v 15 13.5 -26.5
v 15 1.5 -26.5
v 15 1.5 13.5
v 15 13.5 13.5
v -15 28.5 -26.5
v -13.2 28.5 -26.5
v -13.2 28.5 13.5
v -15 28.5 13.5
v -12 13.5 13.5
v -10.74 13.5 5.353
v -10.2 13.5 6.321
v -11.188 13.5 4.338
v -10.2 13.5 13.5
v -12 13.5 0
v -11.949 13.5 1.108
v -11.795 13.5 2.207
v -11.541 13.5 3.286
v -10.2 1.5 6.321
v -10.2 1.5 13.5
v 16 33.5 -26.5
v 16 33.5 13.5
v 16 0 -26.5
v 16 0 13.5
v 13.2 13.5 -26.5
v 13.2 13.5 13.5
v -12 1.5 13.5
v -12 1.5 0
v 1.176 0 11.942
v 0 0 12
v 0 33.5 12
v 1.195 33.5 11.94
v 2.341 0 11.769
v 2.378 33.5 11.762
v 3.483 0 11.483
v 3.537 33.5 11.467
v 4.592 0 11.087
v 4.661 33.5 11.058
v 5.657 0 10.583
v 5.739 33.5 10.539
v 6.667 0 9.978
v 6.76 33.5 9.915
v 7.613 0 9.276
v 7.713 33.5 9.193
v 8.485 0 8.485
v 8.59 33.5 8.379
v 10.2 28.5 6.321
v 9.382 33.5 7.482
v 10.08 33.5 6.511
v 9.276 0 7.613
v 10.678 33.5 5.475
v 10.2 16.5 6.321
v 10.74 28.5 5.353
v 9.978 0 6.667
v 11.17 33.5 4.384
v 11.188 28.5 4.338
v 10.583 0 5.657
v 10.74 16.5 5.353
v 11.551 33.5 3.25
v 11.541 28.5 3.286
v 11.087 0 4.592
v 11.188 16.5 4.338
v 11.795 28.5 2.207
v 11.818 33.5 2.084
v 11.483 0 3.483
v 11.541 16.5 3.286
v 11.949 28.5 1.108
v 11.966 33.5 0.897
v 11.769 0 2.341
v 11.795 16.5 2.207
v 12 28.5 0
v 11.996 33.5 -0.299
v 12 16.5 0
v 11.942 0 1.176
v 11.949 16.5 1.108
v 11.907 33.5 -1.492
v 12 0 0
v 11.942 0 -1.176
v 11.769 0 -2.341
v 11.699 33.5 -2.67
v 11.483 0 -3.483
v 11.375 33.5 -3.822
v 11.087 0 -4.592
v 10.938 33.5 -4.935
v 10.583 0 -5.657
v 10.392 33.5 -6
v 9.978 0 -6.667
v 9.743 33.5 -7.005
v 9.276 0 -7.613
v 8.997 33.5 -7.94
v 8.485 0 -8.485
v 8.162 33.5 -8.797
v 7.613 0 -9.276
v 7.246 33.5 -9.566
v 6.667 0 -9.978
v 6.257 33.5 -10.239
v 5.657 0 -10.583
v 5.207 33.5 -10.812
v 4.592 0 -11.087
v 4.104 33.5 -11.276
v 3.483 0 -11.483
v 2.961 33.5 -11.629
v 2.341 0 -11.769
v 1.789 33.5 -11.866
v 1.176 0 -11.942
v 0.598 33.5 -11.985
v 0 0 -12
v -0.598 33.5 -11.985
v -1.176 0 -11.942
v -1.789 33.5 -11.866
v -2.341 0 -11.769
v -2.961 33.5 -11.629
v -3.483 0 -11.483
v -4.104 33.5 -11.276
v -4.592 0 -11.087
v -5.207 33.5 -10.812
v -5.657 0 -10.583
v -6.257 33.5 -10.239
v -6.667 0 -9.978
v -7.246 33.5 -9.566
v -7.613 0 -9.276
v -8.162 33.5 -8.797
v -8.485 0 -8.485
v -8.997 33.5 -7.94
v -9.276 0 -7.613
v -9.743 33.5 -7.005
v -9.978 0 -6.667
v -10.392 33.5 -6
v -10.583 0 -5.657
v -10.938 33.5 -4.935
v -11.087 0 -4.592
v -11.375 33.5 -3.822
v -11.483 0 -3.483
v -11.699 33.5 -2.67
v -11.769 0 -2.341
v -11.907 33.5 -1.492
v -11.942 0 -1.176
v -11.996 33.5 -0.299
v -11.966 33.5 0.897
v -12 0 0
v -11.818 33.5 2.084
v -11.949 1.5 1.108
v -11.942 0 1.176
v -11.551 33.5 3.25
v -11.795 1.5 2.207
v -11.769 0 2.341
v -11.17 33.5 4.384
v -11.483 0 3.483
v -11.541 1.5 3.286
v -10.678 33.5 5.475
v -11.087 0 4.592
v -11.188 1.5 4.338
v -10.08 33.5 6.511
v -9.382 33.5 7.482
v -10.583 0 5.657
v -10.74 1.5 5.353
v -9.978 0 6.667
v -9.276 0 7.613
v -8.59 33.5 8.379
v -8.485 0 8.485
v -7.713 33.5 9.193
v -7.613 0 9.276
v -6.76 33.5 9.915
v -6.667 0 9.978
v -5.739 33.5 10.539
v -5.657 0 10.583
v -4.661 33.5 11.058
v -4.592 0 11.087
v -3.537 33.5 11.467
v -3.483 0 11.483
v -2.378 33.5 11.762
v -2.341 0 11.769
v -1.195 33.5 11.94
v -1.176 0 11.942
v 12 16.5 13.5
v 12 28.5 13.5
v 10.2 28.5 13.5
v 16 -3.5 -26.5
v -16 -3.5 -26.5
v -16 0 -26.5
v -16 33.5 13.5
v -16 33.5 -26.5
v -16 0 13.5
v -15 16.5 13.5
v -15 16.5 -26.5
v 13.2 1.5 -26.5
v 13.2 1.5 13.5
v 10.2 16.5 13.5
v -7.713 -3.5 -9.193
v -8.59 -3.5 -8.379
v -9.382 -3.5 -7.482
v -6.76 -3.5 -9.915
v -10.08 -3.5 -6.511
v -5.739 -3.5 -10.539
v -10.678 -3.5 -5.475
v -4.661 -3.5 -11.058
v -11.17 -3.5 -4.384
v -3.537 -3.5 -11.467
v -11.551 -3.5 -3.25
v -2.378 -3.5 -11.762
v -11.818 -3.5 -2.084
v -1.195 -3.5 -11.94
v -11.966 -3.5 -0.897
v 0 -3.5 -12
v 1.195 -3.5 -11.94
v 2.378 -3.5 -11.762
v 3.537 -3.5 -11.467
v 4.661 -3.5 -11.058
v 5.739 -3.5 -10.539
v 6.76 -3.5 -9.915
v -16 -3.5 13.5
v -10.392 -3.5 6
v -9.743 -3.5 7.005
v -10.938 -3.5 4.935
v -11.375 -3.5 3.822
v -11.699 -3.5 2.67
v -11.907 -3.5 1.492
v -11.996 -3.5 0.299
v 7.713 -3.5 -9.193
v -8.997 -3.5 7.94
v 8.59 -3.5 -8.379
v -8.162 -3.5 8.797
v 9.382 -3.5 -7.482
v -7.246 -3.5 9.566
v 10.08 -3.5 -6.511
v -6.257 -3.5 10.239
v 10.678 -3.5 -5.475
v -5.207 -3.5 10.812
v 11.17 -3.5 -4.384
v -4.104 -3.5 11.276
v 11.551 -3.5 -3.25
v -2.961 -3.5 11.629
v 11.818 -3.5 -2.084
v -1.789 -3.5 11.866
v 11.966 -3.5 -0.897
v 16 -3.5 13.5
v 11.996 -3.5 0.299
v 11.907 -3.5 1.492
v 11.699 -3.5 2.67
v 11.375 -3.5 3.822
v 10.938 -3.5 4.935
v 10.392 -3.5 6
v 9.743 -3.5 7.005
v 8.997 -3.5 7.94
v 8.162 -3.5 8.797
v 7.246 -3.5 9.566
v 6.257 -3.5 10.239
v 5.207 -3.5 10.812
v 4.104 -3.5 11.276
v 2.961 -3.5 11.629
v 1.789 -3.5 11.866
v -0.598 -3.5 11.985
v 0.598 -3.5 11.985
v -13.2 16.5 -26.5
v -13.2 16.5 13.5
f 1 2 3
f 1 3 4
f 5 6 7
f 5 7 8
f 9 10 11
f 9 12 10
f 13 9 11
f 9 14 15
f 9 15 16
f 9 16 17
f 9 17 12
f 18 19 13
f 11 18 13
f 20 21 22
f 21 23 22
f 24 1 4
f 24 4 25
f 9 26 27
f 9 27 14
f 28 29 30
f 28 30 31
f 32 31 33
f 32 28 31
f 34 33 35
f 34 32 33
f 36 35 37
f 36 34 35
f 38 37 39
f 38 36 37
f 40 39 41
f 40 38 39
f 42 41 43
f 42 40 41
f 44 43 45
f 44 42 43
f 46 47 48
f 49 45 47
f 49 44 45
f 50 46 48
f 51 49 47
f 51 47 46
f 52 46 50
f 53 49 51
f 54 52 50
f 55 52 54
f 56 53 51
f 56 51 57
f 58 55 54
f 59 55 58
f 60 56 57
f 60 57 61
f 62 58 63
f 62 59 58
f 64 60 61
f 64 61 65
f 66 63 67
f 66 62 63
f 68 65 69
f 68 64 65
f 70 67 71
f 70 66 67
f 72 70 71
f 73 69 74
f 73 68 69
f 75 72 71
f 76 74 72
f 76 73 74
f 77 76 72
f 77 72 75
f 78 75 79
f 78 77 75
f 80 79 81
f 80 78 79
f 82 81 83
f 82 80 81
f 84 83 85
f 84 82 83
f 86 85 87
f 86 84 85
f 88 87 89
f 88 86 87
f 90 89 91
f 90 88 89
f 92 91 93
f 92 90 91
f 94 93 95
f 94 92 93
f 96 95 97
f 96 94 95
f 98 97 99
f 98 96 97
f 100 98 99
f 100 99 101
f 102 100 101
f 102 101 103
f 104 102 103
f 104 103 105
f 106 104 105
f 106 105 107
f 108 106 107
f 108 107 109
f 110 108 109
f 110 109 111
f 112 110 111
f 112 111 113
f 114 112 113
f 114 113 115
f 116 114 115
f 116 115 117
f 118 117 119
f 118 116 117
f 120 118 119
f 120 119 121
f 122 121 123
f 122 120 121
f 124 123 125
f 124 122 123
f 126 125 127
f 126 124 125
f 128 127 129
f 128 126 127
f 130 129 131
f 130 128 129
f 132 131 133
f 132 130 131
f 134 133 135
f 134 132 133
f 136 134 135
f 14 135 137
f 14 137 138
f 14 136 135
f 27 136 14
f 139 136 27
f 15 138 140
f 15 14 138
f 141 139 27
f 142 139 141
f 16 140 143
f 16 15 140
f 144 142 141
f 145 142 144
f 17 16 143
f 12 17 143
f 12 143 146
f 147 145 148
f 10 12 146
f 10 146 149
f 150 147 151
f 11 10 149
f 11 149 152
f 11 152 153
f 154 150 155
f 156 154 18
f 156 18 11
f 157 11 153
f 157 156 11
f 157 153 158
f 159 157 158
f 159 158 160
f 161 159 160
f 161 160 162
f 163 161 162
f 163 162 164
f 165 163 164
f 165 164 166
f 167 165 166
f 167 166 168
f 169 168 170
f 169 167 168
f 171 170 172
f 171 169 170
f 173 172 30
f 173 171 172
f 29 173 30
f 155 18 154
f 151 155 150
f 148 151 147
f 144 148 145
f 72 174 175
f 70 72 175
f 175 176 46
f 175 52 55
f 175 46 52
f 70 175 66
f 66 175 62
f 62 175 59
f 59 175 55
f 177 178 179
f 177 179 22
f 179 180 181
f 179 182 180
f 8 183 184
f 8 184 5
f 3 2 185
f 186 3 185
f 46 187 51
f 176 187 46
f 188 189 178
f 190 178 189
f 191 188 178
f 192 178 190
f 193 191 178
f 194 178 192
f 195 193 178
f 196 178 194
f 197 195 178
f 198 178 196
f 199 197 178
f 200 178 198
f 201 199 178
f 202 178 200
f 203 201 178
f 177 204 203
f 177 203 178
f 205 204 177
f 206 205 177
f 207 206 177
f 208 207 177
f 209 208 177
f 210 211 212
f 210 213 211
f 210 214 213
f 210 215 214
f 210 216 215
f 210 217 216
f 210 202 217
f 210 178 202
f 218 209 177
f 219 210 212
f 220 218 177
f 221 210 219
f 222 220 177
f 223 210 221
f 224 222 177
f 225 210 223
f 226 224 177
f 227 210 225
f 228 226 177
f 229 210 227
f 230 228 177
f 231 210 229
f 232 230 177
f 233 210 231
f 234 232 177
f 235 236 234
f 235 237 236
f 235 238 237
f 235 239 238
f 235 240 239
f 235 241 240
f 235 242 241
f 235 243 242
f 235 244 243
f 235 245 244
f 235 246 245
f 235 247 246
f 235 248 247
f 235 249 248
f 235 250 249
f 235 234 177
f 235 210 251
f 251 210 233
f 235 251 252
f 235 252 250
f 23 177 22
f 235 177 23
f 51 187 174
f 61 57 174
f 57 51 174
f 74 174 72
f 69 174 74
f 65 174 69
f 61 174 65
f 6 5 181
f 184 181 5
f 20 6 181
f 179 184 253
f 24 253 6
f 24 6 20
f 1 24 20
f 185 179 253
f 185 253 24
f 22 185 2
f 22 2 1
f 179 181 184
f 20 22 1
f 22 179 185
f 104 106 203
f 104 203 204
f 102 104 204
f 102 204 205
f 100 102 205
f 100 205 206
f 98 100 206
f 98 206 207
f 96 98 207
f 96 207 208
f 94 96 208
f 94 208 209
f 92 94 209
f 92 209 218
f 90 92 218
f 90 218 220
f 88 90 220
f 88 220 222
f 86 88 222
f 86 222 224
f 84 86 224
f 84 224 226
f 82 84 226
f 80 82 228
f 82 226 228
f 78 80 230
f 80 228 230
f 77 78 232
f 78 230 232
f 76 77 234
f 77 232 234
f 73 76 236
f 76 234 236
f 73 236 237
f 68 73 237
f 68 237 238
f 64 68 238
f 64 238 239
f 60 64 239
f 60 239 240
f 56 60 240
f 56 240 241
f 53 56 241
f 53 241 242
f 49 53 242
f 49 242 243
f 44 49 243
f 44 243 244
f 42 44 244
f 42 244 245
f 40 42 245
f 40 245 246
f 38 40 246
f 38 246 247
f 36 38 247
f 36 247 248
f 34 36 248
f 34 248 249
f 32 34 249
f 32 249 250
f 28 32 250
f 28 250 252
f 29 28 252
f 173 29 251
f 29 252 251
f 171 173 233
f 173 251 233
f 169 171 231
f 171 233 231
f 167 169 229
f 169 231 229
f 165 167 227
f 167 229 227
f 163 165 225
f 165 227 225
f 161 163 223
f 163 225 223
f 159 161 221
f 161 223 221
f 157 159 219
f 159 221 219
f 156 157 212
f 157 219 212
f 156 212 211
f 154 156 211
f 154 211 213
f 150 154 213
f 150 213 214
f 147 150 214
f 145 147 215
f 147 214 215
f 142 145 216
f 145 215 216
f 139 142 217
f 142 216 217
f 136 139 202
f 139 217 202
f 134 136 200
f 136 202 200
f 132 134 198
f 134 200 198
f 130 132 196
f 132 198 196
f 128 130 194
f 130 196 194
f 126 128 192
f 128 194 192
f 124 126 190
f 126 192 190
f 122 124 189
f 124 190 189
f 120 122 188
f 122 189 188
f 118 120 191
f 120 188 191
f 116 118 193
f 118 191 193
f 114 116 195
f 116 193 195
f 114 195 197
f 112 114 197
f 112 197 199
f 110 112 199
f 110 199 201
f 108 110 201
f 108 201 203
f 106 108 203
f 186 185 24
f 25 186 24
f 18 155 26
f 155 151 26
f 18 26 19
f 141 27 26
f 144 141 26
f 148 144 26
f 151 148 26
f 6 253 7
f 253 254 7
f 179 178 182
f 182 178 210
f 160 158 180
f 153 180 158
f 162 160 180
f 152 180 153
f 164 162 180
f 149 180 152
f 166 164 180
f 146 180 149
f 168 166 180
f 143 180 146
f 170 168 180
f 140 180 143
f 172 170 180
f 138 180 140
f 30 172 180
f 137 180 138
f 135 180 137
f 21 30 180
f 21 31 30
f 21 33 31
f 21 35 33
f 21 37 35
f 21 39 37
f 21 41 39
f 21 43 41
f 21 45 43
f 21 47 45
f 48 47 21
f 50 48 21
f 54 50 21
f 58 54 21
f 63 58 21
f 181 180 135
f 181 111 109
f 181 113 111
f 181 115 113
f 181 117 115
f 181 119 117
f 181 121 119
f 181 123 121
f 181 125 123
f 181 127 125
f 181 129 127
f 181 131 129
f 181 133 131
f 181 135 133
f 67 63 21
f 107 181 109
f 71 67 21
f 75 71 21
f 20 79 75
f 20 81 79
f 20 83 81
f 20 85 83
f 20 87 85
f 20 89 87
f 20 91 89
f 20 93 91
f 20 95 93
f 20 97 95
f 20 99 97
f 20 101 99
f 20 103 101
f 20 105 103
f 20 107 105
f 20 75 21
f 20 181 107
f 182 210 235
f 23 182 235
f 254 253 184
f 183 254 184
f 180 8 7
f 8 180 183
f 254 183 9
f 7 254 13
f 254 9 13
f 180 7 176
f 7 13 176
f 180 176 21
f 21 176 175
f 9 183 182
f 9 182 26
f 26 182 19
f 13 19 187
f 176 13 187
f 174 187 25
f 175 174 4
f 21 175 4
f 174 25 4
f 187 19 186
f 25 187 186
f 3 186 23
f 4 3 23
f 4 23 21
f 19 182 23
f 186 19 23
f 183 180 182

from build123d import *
from build123d.topology import SkipClean

# Parameters (mm, degrees)
SKETCH1_W           = 32
SKETCH1_H           = 27
SKETCH1_R           = 12
BOSS_EXTRUDE1_DEPTH = 30
SKETCH3_W           = 1.8
SKETCH3_H           = 12
CUT_EXTRUDE1_DEPTH  = 13.5
SKETCH4_W           = 1.8
SKETCH4_H           = 12
CUT_EXTRUDE2_DEPTH  = 44.416586692
SKETCH5_W           = 32
SKETCH5_H           = 30
SKETCH5_W_2         = 1.8
SKETCH5_H_2         = 12
BOSS_EXTRUDE2_DEPTH = 13
SKETCH6_W           = 32
SKETCH6_H           = 40
SKETCH6_R           = 12
BOSS_EXTRUDE3_DEPTH = 3.5
BOSS_EXTRUDE4_START = 3.5
SKETCH7_W           = 32
SKETCH7_H           = 40
SKETCH7_R           = 12
BOSS_EXTRUDE4_DEPTH = 3.5


with BuildPart() as part:
    # Sketch1 → Boss-Extrude1 (new body)
    with BuildSketch(Plane(origin=(0, 0, 0), x_dir=(1, 0, 0), z_dir=(0, 1, 0))):
        Rectangle(SKETCH1_W, SKETCH1_H)
        with Locations(Location((0, 0, 0), (0, 0, 270))):
            Circle(SKETCH1_R, mode=Mode.SUBTRACT)
    extrude(amount=BOSS_EXTRUDE1_DEPTH)

    # Sketch3 → Cut-Extrude1 (cut)
    with BuildSketch(Plane.XY.offset(13.5)):
        with Locations((-11.1, 7.5)):
            Rectangle(SKETCH3_W, SKETCH3_H)
        with Locations((11.1, 22.5)):
            Rectangle(SKETCH3_W, SKETCH3_H)
    extrude(amount=-CUT_EXTRUDE1_DEPTH, mode=Mode.SUBTRACT)

    # Sketch4 → Cut-Extrude2 (cut, through all)
    with BuildSketch(Plane.XY.offset(13.5)):
        with Locations((-14.1, 22.5)):
            Rectangle(SKETCH4_W, SKETCH4_H)
        with Locations((14.1, 7.5)):
            Rectangle(SKETCH4_W, SKETCH4_H)
    extrude(amount=-CUT_EXTRUDE2_DEPTH, mode=Mode.SUBTRACT)

    # Sketch5 → Boss-Extrude2 (add)
    with BuildSketch(Plane(origin=(0, 0, -13.5), x_dir=(-1, 0, 0), z_dir=(0, 0, -1))):
        with Locations((0, 15)):
            Rectangle(SKETCH5_W, SKETCH5_H)
        with Locations((14.1, 22.5)):
            Rectangle(SKETCH5_W_2, SKETCH5_H_2, mode=Mode.SUBTRACT)
        with Locations((-14.1, 7.5)):
            Rectangle(SKETCH5_W_2, SKETCH5_H_2, mode=Mode.SUBTRACT)
    extrude(amount=BOSS_EXTRUDE2_DEPTH)

    # Sketch6 → Boss-Extrude3 (add)
    with BuildSketch(Plane(origin=(0, 30, 0), x_dir=(1, 0, 0), z_dir=(0, 1, 0))):
        with Locations((0, 6.5)):
            Rectangle(SKETCH6_W, SKETCH6_H)
        with Locations(Location((0, 0, 0), (0, 0, 270))):
            Circle(SKETCH6_R, mode=Mode.SUBTRACT)
    extrude(amount=BOSS_EXTRUDE3_DEPTH)

    # Sketch7 → Boss-Extrude4 (add)
    with SkipClean():  # the faces are left unmerged after this step: merging them gives an invalid solid
        with BuildSketch(Plane.XZ.offset(BOSS_EXTRUDE4_START)):
            with Locations((0, -6.5)):
                Rectangle(SKETCH7_W, SKETCH7_H)
            with Locations(Location((0, 0, 0), (0, 0, 270))):
                Circle(SKETCH7_R, mode=Mode.SUBTRACT)
        extrude(amount=-BOSS_EXTRUDE4_DEPTH)


solid = part.part
